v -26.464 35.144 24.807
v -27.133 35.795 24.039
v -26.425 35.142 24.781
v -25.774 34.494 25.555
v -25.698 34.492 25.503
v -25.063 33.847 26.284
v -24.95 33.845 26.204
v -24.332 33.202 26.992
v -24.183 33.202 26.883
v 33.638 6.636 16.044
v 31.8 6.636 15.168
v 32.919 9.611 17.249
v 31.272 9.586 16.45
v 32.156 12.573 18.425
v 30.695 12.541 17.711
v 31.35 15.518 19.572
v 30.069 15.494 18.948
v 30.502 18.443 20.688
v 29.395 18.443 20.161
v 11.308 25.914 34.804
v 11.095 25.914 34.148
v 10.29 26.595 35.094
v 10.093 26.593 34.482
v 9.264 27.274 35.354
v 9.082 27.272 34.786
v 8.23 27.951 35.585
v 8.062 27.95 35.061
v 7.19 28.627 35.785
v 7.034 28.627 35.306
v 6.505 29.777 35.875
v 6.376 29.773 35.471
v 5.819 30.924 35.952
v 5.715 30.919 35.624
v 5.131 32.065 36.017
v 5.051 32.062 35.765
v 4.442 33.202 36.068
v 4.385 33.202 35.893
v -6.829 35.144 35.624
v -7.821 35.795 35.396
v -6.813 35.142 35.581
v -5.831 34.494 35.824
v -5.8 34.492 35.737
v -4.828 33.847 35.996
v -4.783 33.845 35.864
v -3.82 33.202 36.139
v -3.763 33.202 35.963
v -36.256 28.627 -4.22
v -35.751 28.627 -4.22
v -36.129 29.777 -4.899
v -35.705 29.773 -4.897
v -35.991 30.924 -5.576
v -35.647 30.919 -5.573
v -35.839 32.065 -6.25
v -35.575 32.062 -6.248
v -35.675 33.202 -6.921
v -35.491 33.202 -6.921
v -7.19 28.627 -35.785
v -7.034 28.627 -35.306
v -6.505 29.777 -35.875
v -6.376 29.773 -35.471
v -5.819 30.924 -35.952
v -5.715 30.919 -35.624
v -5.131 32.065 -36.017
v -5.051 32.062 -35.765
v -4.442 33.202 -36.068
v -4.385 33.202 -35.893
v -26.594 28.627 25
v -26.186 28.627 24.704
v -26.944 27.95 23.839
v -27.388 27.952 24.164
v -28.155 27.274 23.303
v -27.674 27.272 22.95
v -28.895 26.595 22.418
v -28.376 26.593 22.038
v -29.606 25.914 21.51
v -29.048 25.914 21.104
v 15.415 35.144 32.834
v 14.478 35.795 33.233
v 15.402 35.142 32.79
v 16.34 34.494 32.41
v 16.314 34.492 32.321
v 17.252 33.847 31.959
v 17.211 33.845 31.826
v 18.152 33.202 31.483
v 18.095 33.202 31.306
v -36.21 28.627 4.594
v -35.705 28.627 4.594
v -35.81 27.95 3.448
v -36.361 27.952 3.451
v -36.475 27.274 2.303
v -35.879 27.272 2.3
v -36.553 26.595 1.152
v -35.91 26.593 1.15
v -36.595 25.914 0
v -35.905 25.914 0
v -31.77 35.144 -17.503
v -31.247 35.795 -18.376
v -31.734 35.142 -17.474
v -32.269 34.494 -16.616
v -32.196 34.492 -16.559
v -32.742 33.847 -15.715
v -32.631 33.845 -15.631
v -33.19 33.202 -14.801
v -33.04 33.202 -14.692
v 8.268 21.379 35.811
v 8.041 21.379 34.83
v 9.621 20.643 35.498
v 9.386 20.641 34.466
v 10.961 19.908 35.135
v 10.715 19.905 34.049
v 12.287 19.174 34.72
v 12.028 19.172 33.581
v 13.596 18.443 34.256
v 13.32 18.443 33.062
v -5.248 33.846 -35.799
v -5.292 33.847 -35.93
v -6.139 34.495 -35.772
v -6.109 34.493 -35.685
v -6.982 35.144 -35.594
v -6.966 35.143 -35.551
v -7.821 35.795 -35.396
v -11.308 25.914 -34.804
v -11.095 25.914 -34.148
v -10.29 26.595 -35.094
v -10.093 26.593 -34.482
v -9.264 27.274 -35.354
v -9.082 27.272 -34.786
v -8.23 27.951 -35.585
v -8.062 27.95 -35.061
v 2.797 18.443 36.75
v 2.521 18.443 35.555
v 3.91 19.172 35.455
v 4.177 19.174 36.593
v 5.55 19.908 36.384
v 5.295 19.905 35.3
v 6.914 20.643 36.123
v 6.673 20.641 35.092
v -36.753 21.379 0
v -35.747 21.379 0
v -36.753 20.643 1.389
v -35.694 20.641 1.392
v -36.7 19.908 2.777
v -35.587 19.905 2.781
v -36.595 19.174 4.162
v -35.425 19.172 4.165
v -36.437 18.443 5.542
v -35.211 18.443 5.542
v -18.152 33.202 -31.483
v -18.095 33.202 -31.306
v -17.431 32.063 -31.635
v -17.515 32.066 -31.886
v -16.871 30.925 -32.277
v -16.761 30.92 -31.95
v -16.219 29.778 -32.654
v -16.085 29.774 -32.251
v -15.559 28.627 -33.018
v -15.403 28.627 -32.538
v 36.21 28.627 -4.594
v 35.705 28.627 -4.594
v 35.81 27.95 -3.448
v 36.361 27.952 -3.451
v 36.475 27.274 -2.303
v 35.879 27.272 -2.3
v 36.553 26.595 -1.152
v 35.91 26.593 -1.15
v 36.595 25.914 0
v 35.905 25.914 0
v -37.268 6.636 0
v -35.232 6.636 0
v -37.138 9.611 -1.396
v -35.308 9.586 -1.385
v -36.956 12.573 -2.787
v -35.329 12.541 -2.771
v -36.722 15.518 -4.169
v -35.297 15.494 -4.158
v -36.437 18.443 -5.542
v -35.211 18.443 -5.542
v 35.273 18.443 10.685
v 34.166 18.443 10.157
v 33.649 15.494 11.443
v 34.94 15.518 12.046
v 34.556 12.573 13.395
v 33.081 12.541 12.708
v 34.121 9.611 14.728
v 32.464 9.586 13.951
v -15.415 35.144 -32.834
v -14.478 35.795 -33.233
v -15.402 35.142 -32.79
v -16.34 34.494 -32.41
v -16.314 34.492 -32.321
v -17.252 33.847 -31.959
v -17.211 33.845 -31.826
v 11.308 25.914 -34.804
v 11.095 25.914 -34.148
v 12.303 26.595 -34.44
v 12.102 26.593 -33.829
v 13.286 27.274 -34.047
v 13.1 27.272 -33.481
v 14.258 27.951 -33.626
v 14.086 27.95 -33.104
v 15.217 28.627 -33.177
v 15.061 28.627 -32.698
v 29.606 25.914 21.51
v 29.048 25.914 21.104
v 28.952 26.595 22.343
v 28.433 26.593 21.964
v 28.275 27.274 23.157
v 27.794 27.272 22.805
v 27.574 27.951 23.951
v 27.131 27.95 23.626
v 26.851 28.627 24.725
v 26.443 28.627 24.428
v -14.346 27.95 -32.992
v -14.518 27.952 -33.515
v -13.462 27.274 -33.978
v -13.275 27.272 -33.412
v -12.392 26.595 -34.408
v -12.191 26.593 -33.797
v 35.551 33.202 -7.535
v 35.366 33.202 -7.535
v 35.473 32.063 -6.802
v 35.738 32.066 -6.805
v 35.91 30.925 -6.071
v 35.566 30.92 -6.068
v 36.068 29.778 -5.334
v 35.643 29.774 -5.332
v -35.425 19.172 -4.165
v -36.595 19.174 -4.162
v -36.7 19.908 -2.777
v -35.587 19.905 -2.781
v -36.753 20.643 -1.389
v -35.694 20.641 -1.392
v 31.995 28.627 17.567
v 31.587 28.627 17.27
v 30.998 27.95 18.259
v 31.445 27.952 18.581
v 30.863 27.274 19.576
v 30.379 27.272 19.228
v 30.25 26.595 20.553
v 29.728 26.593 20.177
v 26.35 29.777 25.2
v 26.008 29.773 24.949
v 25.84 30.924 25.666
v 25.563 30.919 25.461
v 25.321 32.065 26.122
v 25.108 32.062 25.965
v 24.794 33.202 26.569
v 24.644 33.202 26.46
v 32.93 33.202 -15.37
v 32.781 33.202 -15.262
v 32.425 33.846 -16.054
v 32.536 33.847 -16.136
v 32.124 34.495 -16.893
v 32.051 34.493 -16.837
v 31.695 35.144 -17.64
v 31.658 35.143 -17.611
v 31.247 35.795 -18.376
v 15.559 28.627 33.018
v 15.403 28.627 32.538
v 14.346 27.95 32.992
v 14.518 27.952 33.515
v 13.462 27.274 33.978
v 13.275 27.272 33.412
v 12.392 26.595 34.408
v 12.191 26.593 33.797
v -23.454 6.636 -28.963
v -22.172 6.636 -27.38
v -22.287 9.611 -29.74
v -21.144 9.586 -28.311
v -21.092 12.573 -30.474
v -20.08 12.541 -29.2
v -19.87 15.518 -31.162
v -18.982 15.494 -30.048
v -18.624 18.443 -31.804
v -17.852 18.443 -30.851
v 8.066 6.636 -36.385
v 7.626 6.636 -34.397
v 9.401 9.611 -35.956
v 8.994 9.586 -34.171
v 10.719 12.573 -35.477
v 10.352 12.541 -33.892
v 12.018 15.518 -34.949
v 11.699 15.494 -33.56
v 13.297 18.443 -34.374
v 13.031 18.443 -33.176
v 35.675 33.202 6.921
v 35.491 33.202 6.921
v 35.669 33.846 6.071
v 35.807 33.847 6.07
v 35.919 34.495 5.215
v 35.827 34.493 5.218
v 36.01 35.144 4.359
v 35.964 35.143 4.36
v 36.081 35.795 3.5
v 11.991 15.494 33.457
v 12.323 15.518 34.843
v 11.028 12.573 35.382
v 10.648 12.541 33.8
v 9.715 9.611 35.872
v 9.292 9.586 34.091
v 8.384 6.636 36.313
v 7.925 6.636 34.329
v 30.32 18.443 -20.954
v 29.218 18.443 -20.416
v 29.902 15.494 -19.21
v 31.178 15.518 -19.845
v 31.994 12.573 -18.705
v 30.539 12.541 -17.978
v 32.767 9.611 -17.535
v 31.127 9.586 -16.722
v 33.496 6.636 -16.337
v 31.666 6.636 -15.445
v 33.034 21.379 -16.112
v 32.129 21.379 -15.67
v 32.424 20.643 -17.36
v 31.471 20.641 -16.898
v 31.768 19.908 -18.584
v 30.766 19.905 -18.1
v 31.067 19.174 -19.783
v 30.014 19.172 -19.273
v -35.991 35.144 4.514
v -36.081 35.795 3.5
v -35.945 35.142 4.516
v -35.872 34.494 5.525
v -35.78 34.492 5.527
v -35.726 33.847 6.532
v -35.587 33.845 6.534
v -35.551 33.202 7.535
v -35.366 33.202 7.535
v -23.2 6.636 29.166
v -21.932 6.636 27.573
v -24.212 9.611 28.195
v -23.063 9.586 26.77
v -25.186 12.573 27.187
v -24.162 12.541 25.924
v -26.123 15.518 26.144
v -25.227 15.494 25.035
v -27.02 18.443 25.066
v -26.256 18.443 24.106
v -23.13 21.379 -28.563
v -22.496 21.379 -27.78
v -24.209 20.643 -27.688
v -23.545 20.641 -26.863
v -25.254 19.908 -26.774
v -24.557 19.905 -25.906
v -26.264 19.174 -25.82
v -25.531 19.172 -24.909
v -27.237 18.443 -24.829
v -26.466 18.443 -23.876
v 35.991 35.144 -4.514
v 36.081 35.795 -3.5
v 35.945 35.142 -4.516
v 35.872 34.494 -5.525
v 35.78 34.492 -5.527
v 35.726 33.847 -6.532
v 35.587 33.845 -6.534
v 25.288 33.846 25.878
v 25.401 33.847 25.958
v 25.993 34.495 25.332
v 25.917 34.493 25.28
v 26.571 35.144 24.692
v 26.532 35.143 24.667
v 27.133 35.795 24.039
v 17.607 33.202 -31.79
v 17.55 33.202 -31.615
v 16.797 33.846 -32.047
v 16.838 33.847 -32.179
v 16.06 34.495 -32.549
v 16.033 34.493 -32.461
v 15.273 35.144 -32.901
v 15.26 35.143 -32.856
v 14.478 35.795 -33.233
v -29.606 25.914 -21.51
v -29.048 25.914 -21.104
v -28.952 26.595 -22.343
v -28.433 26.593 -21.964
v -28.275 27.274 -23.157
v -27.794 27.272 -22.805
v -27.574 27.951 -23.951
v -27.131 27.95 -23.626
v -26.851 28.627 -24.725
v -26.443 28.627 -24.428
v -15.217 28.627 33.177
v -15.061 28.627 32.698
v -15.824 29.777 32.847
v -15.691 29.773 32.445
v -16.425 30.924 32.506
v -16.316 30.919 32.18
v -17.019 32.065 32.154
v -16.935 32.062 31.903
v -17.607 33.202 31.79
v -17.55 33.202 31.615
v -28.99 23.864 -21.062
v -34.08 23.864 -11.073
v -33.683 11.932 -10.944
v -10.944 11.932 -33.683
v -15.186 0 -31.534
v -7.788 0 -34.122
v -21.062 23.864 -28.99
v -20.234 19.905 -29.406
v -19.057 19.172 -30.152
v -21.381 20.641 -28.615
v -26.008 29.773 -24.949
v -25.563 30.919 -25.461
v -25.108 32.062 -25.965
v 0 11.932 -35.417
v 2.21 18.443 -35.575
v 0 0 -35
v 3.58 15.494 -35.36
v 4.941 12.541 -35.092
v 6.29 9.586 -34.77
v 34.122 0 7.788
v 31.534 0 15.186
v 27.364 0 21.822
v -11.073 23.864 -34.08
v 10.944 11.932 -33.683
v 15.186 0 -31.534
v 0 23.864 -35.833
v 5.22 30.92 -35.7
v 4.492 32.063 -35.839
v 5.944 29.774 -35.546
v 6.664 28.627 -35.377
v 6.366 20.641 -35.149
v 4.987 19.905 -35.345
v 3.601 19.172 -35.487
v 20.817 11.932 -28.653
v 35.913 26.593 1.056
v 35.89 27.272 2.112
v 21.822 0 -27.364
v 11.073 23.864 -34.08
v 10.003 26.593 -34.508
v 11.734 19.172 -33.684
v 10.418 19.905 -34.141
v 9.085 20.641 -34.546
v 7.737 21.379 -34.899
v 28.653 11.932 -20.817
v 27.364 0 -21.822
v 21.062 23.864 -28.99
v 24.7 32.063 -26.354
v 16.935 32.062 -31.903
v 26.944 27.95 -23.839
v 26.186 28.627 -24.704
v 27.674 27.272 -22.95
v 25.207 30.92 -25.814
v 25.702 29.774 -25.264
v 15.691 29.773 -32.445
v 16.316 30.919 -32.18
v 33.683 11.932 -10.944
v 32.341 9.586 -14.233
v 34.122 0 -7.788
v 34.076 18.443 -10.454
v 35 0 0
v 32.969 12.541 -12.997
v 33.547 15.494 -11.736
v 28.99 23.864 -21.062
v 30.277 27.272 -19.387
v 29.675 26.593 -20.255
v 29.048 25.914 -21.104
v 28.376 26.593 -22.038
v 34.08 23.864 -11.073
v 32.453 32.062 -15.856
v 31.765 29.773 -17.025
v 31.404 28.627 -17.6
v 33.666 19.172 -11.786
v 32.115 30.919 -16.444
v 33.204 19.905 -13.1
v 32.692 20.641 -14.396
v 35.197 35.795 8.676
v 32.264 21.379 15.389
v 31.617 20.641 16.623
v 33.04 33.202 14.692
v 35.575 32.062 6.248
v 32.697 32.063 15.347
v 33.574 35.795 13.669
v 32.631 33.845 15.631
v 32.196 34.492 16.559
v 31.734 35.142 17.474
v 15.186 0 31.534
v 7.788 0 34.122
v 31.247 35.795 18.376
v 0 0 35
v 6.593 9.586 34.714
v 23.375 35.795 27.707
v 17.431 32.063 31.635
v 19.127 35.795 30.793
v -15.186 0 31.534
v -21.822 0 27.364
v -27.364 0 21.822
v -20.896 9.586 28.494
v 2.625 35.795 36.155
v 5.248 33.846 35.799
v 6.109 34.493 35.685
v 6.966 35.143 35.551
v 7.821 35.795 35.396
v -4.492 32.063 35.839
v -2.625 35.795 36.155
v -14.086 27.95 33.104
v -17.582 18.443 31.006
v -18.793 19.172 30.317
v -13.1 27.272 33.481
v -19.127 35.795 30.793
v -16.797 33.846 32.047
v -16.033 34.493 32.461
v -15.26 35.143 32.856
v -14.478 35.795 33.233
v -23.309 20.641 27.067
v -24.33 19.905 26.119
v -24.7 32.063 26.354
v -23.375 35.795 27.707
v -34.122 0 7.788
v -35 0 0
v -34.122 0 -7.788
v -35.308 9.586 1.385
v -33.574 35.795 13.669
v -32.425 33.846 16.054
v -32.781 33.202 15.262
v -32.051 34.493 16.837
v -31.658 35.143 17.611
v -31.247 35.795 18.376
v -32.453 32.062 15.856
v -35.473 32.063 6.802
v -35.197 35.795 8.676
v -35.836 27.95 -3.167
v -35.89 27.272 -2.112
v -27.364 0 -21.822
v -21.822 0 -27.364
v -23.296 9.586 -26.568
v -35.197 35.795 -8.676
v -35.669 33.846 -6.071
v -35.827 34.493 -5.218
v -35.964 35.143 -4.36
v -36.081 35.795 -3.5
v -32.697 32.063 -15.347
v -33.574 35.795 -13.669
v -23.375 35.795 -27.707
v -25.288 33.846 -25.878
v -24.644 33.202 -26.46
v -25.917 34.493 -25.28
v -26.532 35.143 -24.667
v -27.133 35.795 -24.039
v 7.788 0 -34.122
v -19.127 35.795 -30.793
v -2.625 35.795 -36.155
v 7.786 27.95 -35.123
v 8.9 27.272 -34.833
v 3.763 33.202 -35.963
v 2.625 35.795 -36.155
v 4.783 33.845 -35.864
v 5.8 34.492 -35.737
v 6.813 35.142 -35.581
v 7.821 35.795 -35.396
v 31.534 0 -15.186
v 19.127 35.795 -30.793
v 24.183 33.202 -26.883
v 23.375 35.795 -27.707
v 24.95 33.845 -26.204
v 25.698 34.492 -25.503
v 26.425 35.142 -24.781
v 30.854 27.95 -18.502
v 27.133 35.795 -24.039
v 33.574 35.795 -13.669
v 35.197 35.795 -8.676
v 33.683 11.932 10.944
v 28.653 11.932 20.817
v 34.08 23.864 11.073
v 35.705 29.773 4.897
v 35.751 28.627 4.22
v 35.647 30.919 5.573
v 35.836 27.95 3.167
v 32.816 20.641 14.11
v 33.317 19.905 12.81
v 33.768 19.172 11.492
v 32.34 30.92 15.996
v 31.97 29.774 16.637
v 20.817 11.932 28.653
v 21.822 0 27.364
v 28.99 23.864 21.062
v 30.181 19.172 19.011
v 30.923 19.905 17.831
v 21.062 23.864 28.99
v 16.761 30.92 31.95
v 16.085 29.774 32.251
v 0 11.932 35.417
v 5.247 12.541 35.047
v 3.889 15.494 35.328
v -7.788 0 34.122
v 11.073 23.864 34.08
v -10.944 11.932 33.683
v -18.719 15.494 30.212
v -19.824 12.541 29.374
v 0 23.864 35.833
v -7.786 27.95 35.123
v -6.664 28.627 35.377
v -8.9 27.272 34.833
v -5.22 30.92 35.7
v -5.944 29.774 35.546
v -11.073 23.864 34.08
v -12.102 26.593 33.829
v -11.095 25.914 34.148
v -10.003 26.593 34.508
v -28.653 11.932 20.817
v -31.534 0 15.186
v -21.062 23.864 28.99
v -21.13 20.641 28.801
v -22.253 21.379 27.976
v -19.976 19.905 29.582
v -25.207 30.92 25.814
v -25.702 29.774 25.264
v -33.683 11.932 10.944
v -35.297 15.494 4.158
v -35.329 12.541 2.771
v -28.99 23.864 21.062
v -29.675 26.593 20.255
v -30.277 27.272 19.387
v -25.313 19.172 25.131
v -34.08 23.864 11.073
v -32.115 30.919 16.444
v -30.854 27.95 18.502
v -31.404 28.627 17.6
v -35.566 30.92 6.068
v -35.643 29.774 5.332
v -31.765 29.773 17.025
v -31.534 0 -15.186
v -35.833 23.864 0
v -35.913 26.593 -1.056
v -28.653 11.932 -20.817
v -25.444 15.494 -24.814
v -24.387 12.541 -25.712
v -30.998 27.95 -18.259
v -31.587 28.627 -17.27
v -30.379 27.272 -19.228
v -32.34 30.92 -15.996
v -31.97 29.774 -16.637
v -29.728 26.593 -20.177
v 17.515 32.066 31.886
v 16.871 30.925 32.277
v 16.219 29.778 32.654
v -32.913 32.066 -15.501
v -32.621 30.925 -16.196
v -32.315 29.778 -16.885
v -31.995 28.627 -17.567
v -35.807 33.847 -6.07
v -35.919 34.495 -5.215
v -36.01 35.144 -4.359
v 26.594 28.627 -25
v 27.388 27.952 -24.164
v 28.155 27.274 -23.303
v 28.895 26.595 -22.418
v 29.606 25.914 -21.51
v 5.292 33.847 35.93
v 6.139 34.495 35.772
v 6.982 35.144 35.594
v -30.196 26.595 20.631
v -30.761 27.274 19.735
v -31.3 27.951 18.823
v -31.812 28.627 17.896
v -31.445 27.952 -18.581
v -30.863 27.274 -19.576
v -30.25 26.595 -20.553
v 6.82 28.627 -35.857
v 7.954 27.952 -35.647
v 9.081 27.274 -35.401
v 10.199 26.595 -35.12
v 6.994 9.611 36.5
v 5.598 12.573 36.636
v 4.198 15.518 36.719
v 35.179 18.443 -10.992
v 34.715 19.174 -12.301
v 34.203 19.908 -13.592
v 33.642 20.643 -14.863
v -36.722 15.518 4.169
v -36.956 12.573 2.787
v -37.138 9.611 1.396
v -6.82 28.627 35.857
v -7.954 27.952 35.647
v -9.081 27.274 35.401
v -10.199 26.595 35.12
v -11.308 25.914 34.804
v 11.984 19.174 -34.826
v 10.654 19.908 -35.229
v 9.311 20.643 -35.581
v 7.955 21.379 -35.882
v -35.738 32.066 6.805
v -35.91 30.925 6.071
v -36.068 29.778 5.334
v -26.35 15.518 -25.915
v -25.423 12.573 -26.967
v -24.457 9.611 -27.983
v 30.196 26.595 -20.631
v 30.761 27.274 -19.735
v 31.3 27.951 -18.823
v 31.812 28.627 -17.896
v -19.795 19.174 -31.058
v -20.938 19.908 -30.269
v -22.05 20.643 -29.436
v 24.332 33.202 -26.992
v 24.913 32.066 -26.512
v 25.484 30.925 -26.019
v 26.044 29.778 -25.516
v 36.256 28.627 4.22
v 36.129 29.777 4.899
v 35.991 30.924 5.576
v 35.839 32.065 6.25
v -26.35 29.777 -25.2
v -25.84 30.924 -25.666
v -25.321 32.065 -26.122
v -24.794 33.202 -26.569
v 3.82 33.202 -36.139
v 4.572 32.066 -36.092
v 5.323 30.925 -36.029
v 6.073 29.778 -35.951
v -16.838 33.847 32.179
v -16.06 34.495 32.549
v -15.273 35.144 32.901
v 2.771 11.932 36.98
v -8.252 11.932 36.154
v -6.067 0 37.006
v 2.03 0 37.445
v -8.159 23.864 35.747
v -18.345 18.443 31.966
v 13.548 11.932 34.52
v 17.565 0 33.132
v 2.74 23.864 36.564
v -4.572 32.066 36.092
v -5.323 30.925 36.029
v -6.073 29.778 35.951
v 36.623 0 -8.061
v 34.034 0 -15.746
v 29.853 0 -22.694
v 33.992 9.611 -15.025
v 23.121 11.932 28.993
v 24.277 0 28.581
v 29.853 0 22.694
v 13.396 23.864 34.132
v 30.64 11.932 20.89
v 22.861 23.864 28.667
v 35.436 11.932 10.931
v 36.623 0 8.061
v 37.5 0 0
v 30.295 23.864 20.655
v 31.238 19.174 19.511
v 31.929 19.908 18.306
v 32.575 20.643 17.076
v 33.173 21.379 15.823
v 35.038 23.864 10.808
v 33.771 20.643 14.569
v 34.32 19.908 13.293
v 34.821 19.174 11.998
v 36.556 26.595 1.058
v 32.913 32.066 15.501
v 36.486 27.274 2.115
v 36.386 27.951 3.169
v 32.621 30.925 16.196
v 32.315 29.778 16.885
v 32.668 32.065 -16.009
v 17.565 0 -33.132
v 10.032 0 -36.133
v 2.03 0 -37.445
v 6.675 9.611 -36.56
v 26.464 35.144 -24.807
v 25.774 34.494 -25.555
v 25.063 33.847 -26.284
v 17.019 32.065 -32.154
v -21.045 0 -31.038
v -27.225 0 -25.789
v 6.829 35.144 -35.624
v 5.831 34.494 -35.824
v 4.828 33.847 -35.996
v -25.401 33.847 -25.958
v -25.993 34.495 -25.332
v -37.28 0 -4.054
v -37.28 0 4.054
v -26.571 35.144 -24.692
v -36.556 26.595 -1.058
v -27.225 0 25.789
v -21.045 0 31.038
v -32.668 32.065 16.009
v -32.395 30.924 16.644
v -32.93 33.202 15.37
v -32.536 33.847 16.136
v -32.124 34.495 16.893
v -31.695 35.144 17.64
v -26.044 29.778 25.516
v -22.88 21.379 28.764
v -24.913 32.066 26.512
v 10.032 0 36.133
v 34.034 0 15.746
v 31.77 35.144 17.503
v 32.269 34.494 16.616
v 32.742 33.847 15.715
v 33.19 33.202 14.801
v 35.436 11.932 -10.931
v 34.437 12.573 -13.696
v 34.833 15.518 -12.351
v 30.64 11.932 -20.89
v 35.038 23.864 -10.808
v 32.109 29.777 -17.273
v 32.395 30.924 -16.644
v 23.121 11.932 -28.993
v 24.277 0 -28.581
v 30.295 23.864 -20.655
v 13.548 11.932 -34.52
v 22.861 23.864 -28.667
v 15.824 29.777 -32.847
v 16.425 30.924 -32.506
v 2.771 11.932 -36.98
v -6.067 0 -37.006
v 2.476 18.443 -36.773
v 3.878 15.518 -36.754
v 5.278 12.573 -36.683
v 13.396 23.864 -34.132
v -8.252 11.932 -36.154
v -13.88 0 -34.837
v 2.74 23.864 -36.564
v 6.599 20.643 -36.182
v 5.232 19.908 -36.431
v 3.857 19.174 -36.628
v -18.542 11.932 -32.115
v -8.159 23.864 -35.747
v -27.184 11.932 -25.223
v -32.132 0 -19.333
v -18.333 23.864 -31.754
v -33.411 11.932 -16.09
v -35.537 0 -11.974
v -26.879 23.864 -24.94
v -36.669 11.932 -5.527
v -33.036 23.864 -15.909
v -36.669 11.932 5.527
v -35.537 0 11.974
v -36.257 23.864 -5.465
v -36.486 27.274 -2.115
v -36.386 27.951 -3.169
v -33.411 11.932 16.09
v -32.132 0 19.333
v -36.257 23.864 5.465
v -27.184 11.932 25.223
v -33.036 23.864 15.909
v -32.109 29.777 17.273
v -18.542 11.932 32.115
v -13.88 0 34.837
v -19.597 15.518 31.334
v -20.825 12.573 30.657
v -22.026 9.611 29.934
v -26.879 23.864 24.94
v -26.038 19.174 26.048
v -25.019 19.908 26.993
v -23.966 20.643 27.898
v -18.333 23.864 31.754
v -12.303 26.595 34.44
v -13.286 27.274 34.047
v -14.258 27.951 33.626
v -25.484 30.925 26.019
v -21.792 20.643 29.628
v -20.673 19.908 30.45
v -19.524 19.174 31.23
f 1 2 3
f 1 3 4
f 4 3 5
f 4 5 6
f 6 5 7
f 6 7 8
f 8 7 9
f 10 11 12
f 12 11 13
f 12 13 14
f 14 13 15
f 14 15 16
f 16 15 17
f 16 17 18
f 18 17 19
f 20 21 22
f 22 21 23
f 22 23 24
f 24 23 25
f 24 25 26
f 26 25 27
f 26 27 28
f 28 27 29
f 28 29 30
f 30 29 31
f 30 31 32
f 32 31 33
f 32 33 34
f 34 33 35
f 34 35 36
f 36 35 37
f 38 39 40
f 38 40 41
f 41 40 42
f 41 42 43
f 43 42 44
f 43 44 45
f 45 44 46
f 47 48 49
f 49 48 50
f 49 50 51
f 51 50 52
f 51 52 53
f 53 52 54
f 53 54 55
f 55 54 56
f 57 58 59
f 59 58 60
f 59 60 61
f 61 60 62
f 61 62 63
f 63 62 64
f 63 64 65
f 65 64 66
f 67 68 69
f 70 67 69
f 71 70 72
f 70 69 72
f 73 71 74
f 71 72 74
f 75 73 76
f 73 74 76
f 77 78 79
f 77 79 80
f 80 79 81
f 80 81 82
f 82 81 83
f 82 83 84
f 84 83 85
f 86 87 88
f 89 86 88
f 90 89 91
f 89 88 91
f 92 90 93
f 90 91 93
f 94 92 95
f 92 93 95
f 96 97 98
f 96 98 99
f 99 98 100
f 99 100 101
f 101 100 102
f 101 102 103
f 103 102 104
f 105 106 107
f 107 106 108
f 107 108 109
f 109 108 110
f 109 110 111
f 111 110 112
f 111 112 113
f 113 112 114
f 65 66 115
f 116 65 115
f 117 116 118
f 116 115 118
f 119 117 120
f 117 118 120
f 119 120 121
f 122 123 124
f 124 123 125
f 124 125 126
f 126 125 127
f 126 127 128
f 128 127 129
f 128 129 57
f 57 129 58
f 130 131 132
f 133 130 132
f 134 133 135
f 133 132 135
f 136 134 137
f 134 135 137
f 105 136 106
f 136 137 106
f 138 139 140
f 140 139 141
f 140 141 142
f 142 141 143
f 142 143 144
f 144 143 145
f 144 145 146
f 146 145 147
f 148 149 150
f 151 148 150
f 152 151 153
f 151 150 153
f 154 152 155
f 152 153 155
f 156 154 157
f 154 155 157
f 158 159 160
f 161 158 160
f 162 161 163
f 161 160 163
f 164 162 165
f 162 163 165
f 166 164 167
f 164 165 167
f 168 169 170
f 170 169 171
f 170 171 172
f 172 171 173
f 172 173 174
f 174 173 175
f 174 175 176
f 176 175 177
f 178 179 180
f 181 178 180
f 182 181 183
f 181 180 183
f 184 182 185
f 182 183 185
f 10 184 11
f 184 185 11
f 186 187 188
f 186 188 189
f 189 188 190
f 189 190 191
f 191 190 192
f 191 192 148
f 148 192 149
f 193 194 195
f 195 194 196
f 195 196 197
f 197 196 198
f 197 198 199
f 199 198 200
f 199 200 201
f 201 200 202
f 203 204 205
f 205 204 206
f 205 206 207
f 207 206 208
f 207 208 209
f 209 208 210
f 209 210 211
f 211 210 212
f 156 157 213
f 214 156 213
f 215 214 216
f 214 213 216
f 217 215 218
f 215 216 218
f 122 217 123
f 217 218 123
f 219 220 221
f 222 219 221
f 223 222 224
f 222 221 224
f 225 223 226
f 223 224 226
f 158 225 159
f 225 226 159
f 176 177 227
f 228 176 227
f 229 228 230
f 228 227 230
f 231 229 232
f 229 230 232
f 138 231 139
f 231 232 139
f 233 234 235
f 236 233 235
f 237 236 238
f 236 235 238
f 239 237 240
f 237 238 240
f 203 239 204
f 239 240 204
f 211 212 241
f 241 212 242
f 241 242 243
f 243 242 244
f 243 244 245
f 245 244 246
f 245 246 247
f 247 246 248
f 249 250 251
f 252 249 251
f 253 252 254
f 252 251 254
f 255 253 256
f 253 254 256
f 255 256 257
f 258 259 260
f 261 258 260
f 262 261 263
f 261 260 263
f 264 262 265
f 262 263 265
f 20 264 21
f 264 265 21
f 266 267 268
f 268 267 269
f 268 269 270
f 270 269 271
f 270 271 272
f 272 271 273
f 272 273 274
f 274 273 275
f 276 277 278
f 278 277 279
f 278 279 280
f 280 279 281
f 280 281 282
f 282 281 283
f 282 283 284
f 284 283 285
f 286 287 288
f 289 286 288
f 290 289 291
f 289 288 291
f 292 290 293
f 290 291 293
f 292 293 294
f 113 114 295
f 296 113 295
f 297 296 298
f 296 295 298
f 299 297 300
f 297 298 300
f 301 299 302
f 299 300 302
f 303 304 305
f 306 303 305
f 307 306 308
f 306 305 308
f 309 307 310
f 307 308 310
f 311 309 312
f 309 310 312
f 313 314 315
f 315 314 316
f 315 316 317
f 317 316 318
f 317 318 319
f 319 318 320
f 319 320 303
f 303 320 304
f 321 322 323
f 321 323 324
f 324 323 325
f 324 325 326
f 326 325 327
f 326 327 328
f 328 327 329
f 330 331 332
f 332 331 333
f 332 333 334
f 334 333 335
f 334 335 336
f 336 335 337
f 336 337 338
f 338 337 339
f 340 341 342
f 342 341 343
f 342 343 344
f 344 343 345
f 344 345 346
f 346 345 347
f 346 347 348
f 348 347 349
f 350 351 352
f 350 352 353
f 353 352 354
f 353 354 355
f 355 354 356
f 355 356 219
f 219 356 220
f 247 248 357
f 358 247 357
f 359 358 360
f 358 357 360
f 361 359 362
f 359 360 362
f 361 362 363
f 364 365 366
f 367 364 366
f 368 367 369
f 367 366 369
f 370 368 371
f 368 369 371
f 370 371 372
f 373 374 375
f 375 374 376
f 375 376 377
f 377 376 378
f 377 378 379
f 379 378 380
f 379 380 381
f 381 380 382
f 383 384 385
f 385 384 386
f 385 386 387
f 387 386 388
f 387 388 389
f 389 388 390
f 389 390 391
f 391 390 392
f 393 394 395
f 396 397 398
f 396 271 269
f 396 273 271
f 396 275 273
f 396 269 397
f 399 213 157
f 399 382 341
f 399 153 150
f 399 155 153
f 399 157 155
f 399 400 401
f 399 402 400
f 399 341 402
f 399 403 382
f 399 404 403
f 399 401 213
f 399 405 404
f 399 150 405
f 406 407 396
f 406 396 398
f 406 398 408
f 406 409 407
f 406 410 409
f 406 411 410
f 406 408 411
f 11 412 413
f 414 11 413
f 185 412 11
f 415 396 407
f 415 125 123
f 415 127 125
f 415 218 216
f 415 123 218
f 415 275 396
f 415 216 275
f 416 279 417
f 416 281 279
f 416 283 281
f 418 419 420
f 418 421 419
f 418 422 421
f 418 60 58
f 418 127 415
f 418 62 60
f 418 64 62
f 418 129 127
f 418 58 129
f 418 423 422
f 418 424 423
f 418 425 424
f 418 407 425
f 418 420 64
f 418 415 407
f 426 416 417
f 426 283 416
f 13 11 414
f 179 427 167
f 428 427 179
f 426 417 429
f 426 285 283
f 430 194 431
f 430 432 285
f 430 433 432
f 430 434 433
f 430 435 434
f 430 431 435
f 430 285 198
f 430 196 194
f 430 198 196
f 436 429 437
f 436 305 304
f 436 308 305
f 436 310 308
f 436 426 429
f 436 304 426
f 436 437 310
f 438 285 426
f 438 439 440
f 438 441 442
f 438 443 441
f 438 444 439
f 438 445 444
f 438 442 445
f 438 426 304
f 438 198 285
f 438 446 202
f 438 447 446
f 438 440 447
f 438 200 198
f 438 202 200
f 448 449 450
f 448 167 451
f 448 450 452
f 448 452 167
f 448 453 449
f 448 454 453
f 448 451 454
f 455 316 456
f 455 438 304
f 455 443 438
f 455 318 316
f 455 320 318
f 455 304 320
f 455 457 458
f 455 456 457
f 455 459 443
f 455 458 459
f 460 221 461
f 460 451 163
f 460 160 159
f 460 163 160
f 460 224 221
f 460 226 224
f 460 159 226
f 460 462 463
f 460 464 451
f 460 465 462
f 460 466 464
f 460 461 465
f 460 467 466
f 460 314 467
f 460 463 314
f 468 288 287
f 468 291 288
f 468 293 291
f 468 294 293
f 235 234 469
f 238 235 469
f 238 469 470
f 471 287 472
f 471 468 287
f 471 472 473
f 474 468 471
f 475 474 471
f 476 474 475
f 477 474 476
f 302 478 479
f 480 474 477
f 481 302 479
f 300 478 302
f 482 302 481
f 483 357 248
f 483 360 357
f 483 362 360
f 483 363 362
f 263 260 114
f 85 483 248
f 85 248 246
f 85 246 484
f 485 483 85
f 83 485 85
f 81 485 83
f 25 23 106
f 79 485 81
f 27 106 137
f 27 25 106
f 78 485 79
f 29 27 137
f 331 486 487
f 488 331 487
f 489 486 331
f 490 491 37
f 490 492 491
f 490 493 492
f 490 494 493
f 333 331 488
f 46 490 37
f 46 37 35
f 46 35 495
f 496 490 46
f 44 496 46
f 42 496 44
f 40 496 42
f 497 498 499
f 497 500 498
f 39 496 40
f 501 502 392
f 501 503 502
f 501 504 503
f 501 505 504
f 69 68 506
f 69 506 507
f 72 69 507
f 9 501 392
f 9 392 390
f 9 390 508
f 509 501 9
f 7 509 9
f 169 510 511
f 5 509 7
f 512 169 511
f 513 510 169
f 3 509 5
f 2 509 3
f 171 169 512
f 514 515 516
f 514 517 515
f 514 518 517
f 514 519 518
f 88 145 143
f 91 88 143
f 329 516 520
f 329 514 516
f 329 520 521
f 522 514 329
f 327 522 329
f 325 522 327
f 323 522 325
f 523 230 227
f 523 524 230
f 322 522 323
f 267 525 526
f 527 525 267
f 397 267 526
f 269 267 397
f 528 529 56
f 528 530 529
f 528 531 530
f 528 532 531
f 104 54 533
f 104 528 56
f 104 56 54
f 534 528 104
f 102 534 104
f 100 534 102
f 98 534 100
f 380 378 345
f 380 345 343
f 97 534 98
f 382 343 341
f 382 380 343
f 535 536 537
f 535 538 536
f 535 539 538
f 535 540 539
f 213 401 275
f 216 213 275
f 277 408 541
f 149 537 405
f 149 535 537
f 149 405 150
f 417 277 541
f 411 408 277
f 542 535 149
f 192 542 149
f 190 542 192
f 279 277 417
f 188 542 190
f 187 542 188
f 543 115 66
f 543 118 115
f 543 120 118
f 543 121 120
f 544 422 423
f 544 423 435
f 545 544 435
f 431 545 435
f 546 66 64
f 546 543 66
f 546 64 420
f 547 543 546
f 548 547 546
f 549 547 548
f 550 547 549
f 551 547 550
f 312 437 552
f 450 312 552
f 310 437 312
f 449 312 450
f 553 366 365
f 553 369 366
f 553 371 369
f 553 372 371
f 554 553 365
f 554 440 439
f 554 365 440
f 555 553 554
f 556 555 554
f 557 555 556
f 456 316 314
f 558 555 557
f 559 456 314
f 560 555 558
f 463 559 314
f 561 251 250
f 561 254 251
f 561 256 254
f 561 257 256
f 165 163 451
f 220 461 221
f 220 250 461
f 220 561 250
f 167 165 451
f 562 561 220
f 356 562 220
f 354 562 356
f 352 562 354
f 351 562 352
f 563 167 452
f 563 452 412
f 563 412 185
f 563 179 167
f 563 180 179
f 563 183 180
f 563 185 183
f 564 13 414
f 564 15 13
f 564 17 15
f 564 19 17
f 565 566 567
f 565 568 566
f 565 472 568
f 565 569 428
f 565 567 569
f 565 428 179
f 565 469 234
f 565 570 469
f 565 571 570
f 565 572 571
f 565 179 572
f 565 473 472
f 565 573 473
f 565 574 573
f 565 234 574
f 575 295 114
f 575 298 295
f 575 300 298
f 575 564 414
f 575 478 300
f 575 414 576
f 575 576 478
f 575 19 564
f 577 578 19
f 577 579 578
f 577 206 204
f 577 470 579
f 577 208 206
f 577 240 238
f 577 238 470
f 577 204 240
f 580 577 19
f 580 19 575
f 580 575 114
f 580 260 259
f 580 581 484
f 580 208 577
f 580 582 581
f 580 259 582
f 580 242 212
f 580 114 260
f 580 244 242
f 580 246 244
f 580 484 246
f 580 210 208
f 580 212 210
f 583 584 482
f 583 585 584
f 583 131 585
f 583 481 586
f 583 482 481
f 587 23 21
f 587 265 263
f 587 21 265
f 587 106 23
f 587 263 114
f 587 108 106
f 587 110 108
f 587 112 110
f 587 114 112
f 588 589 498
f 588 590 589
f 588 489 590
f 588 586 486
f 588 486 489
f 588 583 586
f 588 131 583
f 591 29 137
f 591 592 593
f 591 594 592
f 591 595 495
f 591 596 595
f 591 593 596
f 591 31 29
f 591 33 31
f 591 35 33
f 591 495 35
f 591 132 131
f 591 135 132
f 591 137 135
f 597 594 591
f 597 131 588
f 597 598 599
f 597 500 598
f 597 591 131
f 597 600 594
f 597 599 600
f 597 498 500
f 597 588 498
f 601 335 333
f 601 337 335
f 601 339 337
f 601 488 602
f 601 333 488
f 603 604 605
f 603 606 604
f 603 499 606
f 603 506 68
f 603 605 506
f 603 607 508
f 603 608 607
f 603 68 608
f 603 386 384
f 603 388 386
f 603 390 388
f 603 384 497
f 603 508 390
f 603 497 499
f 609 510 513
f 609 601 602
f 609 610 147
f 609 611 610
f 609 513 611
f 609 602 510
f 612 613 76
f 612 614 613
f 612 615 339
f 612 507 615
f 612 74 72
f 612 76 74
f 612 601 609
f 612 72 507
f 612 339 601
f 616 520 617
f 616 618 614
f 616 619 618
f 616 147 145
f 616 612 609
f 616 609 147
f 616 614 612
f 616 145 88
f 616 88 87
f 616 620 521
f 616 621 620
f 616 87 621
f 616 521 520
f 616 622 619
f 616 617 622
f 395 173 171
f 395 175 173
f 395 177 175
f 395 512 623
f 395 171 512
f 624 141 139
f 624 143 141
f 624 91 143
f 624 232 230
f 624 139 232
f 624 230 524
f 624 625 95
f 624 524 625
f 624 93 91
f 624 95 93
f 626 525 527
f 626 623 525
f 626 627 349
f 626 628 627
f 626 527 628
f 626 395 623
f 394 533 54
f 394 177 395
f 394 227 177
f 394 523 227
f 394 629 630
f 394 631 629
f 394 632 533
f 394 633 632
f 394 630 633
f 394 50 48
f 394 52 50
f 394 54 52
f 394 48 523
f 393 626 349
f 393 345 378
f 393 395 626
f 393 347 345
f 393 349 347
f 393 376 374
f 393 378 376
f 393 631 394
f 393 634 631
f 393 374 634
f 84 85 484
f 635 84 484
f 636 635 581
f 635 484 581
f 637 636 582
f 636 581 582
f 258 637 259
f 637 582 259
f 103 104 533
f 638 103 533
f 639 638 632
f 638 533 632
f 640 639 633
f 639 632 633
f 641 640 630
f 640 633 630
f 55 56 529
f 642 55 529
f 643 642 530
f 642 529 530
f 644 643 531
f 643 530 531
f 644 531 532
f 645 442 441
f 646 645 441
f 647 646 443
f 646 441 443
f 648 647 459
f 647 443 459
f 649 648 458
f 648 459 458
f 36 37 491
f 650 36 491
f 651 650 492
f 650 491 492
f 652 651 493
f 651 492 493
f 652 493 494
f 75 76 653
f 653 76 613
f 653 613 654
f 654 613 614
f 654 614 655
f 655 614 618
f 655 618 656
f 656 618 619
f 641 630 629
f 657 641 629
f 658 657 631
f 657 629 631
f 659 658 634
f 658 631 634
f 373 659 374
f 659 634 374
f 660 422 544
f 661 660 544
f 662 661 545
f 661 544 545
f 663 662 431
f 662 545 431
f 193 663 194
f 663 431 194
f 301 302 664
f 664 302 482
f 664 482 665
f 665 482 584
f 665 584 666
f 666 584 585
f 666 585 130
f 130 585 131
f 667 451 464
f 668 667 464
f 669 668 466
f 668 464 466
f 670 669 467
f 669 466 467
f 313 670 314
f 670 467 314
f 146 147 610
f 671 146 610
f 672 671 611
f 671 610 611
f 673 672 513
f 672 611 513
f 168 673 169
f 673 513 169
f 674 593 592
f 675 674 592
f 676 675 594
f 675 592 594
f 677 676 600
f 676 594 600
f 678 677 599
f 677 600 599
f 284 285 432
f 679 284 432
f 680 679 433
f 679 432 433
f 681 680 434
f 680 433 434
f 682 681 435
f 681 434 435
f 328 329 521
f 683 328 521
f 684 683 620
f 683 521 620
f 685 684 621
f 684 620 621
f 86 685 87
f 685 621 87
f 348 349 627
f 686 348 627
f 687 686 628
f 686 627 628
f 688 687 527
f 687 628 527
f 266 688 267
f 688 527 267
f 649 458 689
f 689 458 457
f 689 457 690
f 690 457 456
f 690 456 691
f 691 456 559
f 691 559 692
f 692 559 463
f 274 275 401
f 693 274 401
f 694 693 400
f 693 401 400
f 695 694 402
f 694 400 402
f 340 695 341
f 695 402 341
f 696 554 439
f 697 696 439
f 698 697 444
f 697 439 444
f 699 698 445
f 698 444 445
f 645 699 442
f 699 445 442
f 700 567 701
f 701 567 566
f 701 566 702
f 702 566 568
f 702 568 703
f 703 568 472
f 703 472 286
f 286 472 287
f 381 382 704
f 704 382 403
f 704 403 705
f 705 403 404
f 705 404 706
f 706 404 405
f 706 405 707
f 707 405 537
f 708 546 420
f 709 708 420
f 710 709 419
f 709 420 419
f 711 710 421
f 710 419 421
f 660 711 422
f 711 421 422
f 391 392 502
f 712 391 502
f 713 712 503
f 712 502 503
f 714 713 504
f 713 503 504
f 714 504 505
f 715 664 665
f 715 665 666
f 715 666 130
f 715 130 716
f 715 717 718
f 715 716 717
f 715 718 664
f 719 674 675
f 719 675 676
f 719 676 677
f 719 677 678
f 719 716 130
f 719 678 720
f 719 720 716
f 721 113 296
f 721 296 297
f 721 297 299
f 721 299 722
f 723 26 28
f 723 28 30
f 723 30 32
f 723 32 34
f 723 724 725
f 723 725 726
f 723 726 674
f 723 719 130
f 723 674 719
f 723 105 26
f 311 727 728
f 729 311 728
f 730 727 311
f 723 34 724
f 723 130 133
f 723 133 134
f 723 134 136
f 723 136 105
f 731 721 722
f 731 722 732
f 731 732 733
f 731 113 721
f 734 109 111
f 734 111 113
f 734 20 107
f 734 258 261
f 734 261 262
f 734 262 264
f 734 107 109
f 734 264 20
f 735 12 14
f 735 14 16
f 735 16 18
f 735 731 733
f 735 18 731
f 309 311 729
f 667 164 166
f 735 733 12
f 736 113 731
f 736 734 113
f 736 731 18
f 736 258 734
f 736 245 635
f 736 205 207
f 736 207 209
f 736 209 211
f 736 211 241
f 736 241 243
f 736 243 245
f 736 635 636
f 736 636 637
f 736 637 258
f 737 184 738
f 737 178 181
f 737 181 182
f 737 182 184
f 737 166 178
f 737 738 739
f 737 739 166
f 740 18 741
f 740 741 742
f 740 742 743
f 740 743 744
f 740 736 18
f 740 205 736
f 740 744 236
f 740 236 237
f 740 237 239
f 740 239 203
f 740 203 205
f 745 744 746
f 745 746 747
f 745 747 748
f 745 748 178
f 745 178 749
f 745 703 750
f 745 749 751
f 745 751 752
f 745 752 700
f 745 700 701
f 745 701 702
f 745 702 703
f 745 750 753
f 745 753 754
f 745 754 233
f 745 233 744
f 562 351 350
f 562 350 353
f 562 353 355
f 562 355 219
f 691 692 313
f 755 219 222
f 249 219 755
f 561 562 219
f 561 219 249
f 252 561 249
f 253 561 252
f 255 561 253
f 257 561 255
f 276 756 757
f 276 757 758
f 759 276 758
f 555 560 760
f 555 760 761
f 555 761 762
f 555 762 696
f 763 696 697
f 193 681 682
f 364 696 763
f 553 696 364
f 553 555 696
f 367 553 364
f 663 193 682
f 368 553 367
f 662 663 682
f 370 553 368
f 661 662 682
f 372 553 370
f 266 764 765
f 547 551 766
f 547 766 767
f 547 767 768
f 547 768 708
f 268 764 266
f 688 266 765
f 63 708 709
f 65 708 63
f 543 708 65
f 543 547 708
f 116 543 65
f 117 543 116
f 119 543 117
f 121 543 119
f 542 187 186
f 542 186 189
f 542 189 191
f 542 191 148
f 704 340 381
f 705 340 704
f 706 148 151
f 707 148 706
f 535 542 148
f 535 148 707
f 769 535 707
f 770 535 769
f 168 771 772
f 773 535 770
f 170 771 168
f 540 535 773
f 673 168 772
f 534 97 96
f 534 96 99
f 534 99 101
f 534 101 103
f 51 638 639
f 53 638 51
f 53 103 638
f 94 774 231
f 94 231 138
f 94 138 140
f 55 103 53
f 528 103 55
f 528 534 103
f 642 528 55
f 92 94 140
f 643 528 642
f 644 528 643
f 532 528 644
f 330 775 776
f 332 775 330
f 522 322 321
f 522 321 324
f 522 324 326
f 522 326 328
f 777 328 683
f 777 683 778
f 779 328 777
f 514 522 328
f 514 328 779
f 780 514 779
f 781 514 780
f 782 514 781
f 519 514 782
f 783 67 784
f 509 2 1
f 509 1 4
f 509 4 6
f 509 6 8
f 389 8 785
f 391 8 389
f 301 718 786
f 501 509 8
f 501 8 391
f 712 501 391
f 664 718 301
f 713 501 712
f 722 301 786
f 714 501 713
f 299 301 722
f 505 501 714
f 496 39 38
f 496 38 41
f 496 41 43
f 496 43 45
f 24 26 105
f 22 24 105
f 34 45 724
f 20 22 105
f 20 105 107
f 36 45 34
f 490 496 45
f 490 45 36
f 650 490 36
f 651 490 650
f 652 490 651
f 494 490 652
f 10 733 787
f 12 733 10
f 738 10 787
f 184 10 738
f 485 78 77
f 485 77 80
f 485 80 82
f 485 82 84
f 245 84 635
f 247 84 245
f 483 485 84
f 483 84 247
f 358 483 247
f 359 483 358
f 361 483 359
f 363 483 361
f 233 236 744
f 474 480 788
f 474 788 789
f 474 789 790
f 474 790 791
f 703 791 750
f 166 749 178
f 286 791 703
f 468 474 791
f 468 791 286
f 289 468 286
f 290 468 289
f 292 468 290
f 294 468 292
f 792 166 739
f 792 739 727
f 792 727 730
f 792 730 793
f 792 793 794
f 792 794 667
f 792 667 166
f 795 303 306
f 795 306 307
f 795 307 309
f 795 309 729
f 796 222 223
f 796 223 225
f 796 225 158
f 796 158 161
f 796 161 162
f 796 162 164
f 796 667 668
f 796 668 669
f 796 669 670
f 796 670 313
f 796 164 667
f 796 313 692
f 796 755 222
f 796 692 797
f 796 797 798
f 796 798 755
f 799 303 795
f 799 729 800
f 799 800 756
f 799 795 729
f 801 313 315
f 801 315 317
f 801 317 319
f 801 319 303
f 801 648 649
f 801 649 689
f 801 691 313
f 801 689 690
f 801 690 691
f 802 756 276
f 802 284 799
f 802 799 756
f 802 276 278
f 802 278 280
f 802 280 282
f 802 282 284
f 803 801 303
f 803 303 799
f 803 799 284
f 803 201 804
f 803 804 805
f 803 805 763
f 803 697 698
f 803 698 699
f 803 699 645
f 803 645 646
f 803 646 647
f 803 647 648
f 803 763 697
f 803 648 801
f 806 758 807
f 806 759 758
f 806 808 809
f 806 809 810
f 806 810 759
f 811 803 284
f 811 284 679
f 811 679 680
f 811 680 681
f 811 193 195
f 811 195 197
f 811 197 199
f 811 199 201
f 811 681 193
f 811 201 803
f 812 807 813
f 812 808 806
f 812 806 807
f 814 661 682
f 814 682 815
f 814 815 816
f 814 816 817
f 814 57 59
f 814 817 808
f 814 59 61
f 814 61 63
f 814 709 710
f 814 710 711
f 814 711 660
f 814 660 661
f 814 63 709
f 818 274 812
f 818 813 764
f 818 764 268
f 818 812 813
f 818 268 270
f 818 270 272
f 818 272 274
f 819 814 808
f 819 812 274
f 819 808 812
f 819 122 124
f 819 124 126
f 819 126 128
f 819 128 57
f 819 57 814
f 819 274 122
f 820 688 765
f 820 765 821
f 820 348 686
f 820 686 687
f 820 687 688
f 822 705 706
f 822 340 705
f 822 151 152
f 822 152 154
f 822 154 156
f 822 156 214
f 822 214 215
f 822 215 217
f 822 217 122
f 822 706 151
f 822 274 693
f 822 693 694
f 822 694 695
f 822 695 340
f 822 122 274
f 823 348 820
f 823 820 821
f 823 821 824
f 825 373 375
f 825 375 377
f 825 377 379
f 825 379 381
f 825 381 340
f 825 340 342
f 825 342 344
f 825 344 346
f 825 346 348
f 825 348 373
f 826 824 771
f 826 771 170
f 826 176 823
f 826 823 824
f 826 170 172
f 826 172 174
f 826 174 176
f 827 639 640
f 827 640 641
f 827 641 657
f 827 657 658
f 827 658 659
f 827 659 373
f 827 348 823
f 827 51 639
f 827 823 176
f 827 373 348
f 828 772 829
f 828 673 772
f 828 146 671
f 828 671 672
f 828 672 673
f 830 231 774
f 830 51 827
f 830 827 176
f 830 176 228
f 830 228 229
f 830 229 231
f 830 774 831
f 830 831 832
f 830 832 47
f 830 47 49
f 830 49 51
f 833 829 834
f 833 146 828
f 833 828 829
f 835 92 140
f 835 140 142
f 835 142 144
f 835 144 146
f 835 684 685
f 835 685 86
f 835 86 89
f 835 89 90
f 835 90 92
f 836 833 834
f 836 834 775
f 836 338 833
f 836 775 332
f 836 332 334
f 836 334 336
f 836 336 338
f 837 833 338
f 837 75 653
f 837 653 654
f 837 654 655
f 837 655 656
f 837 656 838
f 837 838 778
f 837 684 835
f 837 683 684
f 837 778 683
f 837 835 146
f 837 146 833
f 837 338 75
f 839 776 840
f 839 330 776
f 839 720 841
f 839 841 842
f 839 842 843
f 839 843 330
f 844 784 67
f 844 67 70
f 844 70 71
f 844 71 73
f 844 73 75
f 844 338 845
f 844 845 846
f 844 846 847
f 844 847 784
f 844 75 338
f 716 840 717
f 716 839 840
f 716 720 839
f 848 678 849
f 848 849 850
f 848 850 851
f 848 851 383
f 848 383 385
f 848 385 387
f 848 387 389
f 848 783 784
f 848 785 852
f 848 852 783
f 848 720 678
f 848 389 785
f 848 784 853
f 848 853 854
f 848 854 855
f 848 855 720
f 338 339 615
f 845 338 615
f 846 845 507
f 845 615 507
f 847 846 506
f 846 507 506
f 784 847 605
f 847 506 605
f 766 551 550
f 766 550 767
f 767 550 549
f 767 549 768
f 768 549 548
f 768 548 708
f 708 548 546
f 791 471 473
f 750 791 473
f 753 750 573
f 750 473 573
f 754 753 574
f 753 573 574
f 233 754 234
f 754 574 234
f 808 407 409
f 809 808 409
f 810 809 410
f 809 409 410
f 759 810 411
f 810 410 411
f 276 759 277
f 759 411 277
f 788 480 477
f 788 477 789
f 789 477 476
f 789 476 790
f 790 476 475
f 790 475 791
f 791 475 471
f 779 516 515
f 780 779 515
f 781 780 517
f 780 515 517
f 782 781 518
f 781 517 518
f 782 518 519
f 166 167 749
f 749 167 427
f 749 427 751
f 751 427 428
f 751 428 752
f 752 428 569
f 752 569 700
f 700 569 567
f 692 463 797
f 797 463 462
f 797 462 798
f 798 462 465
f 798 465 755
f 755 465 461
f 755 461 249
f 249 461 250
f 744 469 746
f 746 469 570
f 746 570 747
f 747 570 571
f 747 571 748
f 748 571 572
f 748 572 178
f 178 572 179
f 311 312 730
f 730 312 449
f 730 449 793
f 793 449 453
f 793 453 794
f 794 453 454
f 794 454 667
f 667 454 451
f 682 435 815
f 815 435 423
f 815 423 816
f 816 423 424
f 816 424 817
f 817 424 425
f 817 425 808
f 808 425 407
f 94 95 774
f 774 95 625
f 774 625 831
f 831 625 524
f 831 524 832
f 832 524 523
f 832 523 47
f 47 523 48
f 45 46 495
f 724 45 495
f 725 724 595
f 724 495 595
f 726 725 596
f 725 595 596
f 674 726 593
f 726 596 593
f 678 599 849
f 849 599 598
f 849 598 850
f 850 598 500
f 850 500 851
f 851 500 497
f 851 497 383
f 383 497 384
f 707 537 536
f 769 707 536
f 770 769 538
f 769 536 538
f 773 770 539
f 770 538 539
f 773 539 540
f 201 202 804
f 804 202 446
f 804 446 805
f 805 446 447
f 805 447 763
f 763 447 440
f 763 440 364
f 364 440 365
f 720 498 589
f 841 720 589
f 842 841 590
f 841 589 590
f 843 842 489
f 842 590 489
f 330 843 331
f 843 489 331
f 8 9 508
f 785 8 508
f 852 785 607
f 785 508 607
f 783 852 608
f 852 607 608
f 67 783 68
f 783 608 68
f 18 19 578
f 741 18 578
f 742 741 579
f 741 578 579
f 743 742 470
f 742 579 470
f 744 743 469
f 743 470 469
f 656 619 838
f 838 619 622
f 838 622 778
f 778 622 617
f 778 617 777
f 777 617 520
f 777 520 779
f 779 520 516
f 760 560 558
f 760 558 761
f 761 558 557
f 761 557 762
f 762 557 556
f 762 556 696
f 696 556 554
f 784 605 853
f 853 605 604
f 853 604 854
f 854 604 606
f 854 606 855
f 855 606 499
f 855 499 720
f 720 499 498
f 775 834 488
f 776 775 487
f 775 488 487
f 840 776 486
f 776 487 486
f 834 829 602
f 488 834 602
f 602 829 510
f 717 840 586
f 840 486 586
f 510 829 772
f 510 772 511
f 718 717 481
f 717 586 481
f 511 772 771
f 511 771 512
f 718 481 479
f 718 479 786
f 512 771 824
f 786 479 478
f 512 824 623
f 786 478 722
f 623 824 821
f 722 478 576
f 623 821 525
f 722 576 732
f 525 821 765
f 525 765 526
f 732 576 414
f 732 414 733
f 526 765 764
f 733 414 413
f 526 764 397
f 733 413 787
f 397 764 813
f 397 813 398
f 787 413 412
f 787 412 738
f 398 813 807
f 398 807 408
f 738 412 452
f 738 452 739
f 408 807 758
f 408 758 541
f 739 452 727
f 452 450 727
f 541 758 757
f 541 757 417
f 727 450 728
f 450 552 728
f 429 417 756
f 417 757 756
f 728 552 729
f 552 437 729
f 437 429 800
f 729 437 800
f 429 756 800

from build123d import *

# Parameters (mm, degrees)
SKETCH1_R           = 37.5
SKETCH1_R_2         = 35
BOSS_EXTRUDE1_DEPTH = 40
BOSS_EXTRUDE1_TAPER = 2
CUT_EXTRUDE1_DEPTH  = 40
CIRPATTERN1_COUNT   = 10
CUT_EXTRUDE2_DEPTH  = 40
CIRPATTERN2_COUNT   = 7
CIRPATTERN2_ANGLE   = 309


with BuildPart() as part:
    # Sketch1 → Boss-Extrude1 (new body)
    with BuildSketch(Plane(origin=(0, 0, 0), x_dir=(1, 0, 0), z_dir=(0, 1, 0))):
        Circle(SKETCH1_R)
        Circle(SKETCH1_R_2, mode=Mode.SUBTRACT)
    extrude(amount=BOSS_EXTRUDE1_DEPTH, taper=BOSS_EXTRUDE1_TAPER)

    # Sketch2 → Cut-Extrude1 (cut)
    with BuildSketch(Plane(origin=(0, 0, 0), x_dir=(0, 0, -1), z_dir=(1, 0, 0))):
        with BuildLine():
            Line((-3.5, 35.795316604), (-7.534748759, 33.202081775))
            Line((-7.534748759, 33.202081775), (-4.593988586, 28.626627084))
            Line((-4.593988586, 28.626627084), (0, 25.914355347))
            Line((0, 25.914355347), (4.219955288, 28.626627084))
            Line((4.219955288, 28.626627084), (6.92128469, 33.202081775))
            Line((6.92128469, 33.202081775), (3.5, 35.795316604))
            ThreePointArc((3.5, 35.795316604), (0, 39.295316604), (-3.5, 35.795316604))
        make_face()
    cut_extrude1 = extrude(amount=-CUT_EXTRUDE1_DEPTH, mode=Mode.SUBTRACT)

    # CirPattern1: Cut-Extrude1 ×10 about axis
    cirpattern1_axis = Axis((0, 0, 0), (0, 1, 0))
    for i in range(1, CIRPATTERN1_COUNT):
        add(cut_extrude1.rotate(cirpattern1_axis, i * 360 / CIRPATTERN1_COUNT), mode=Mode.SUBTRACT)

    # Sketch3 → Cut-Extrude2 (cut)
    with BuildSketch(Plane(origin=(0, 0, 0), x_dir=(0, 0, -1), z_dir=(1, 0, 0))):
        Polygon((0, 21.378578538), (-5.541834778, 18.44293311), (0, 6.63639335), (5.541834778, 18.44293311), align=None)
    cut_extrude2 = extrude(amount=-CUT_EXTRUDE2_DEPTH, mode=Mode.SUBTRACT)

    # CirPattern2: Cut-Extrude2 ×7 about axis
    cirpattern2_axis = Axis((0, 0, 0), (0, 1, 0))
    for i in range(1, CIRPATTERN2_COUNT):
        add(cut_extrude2.rotate(cirpattern2_axis, i * CIRPATTERN2_ANGLE / (CIRPATTERN2_COUNT - 1)), mode=Mode.SUBTRACT)


solid = part.part
